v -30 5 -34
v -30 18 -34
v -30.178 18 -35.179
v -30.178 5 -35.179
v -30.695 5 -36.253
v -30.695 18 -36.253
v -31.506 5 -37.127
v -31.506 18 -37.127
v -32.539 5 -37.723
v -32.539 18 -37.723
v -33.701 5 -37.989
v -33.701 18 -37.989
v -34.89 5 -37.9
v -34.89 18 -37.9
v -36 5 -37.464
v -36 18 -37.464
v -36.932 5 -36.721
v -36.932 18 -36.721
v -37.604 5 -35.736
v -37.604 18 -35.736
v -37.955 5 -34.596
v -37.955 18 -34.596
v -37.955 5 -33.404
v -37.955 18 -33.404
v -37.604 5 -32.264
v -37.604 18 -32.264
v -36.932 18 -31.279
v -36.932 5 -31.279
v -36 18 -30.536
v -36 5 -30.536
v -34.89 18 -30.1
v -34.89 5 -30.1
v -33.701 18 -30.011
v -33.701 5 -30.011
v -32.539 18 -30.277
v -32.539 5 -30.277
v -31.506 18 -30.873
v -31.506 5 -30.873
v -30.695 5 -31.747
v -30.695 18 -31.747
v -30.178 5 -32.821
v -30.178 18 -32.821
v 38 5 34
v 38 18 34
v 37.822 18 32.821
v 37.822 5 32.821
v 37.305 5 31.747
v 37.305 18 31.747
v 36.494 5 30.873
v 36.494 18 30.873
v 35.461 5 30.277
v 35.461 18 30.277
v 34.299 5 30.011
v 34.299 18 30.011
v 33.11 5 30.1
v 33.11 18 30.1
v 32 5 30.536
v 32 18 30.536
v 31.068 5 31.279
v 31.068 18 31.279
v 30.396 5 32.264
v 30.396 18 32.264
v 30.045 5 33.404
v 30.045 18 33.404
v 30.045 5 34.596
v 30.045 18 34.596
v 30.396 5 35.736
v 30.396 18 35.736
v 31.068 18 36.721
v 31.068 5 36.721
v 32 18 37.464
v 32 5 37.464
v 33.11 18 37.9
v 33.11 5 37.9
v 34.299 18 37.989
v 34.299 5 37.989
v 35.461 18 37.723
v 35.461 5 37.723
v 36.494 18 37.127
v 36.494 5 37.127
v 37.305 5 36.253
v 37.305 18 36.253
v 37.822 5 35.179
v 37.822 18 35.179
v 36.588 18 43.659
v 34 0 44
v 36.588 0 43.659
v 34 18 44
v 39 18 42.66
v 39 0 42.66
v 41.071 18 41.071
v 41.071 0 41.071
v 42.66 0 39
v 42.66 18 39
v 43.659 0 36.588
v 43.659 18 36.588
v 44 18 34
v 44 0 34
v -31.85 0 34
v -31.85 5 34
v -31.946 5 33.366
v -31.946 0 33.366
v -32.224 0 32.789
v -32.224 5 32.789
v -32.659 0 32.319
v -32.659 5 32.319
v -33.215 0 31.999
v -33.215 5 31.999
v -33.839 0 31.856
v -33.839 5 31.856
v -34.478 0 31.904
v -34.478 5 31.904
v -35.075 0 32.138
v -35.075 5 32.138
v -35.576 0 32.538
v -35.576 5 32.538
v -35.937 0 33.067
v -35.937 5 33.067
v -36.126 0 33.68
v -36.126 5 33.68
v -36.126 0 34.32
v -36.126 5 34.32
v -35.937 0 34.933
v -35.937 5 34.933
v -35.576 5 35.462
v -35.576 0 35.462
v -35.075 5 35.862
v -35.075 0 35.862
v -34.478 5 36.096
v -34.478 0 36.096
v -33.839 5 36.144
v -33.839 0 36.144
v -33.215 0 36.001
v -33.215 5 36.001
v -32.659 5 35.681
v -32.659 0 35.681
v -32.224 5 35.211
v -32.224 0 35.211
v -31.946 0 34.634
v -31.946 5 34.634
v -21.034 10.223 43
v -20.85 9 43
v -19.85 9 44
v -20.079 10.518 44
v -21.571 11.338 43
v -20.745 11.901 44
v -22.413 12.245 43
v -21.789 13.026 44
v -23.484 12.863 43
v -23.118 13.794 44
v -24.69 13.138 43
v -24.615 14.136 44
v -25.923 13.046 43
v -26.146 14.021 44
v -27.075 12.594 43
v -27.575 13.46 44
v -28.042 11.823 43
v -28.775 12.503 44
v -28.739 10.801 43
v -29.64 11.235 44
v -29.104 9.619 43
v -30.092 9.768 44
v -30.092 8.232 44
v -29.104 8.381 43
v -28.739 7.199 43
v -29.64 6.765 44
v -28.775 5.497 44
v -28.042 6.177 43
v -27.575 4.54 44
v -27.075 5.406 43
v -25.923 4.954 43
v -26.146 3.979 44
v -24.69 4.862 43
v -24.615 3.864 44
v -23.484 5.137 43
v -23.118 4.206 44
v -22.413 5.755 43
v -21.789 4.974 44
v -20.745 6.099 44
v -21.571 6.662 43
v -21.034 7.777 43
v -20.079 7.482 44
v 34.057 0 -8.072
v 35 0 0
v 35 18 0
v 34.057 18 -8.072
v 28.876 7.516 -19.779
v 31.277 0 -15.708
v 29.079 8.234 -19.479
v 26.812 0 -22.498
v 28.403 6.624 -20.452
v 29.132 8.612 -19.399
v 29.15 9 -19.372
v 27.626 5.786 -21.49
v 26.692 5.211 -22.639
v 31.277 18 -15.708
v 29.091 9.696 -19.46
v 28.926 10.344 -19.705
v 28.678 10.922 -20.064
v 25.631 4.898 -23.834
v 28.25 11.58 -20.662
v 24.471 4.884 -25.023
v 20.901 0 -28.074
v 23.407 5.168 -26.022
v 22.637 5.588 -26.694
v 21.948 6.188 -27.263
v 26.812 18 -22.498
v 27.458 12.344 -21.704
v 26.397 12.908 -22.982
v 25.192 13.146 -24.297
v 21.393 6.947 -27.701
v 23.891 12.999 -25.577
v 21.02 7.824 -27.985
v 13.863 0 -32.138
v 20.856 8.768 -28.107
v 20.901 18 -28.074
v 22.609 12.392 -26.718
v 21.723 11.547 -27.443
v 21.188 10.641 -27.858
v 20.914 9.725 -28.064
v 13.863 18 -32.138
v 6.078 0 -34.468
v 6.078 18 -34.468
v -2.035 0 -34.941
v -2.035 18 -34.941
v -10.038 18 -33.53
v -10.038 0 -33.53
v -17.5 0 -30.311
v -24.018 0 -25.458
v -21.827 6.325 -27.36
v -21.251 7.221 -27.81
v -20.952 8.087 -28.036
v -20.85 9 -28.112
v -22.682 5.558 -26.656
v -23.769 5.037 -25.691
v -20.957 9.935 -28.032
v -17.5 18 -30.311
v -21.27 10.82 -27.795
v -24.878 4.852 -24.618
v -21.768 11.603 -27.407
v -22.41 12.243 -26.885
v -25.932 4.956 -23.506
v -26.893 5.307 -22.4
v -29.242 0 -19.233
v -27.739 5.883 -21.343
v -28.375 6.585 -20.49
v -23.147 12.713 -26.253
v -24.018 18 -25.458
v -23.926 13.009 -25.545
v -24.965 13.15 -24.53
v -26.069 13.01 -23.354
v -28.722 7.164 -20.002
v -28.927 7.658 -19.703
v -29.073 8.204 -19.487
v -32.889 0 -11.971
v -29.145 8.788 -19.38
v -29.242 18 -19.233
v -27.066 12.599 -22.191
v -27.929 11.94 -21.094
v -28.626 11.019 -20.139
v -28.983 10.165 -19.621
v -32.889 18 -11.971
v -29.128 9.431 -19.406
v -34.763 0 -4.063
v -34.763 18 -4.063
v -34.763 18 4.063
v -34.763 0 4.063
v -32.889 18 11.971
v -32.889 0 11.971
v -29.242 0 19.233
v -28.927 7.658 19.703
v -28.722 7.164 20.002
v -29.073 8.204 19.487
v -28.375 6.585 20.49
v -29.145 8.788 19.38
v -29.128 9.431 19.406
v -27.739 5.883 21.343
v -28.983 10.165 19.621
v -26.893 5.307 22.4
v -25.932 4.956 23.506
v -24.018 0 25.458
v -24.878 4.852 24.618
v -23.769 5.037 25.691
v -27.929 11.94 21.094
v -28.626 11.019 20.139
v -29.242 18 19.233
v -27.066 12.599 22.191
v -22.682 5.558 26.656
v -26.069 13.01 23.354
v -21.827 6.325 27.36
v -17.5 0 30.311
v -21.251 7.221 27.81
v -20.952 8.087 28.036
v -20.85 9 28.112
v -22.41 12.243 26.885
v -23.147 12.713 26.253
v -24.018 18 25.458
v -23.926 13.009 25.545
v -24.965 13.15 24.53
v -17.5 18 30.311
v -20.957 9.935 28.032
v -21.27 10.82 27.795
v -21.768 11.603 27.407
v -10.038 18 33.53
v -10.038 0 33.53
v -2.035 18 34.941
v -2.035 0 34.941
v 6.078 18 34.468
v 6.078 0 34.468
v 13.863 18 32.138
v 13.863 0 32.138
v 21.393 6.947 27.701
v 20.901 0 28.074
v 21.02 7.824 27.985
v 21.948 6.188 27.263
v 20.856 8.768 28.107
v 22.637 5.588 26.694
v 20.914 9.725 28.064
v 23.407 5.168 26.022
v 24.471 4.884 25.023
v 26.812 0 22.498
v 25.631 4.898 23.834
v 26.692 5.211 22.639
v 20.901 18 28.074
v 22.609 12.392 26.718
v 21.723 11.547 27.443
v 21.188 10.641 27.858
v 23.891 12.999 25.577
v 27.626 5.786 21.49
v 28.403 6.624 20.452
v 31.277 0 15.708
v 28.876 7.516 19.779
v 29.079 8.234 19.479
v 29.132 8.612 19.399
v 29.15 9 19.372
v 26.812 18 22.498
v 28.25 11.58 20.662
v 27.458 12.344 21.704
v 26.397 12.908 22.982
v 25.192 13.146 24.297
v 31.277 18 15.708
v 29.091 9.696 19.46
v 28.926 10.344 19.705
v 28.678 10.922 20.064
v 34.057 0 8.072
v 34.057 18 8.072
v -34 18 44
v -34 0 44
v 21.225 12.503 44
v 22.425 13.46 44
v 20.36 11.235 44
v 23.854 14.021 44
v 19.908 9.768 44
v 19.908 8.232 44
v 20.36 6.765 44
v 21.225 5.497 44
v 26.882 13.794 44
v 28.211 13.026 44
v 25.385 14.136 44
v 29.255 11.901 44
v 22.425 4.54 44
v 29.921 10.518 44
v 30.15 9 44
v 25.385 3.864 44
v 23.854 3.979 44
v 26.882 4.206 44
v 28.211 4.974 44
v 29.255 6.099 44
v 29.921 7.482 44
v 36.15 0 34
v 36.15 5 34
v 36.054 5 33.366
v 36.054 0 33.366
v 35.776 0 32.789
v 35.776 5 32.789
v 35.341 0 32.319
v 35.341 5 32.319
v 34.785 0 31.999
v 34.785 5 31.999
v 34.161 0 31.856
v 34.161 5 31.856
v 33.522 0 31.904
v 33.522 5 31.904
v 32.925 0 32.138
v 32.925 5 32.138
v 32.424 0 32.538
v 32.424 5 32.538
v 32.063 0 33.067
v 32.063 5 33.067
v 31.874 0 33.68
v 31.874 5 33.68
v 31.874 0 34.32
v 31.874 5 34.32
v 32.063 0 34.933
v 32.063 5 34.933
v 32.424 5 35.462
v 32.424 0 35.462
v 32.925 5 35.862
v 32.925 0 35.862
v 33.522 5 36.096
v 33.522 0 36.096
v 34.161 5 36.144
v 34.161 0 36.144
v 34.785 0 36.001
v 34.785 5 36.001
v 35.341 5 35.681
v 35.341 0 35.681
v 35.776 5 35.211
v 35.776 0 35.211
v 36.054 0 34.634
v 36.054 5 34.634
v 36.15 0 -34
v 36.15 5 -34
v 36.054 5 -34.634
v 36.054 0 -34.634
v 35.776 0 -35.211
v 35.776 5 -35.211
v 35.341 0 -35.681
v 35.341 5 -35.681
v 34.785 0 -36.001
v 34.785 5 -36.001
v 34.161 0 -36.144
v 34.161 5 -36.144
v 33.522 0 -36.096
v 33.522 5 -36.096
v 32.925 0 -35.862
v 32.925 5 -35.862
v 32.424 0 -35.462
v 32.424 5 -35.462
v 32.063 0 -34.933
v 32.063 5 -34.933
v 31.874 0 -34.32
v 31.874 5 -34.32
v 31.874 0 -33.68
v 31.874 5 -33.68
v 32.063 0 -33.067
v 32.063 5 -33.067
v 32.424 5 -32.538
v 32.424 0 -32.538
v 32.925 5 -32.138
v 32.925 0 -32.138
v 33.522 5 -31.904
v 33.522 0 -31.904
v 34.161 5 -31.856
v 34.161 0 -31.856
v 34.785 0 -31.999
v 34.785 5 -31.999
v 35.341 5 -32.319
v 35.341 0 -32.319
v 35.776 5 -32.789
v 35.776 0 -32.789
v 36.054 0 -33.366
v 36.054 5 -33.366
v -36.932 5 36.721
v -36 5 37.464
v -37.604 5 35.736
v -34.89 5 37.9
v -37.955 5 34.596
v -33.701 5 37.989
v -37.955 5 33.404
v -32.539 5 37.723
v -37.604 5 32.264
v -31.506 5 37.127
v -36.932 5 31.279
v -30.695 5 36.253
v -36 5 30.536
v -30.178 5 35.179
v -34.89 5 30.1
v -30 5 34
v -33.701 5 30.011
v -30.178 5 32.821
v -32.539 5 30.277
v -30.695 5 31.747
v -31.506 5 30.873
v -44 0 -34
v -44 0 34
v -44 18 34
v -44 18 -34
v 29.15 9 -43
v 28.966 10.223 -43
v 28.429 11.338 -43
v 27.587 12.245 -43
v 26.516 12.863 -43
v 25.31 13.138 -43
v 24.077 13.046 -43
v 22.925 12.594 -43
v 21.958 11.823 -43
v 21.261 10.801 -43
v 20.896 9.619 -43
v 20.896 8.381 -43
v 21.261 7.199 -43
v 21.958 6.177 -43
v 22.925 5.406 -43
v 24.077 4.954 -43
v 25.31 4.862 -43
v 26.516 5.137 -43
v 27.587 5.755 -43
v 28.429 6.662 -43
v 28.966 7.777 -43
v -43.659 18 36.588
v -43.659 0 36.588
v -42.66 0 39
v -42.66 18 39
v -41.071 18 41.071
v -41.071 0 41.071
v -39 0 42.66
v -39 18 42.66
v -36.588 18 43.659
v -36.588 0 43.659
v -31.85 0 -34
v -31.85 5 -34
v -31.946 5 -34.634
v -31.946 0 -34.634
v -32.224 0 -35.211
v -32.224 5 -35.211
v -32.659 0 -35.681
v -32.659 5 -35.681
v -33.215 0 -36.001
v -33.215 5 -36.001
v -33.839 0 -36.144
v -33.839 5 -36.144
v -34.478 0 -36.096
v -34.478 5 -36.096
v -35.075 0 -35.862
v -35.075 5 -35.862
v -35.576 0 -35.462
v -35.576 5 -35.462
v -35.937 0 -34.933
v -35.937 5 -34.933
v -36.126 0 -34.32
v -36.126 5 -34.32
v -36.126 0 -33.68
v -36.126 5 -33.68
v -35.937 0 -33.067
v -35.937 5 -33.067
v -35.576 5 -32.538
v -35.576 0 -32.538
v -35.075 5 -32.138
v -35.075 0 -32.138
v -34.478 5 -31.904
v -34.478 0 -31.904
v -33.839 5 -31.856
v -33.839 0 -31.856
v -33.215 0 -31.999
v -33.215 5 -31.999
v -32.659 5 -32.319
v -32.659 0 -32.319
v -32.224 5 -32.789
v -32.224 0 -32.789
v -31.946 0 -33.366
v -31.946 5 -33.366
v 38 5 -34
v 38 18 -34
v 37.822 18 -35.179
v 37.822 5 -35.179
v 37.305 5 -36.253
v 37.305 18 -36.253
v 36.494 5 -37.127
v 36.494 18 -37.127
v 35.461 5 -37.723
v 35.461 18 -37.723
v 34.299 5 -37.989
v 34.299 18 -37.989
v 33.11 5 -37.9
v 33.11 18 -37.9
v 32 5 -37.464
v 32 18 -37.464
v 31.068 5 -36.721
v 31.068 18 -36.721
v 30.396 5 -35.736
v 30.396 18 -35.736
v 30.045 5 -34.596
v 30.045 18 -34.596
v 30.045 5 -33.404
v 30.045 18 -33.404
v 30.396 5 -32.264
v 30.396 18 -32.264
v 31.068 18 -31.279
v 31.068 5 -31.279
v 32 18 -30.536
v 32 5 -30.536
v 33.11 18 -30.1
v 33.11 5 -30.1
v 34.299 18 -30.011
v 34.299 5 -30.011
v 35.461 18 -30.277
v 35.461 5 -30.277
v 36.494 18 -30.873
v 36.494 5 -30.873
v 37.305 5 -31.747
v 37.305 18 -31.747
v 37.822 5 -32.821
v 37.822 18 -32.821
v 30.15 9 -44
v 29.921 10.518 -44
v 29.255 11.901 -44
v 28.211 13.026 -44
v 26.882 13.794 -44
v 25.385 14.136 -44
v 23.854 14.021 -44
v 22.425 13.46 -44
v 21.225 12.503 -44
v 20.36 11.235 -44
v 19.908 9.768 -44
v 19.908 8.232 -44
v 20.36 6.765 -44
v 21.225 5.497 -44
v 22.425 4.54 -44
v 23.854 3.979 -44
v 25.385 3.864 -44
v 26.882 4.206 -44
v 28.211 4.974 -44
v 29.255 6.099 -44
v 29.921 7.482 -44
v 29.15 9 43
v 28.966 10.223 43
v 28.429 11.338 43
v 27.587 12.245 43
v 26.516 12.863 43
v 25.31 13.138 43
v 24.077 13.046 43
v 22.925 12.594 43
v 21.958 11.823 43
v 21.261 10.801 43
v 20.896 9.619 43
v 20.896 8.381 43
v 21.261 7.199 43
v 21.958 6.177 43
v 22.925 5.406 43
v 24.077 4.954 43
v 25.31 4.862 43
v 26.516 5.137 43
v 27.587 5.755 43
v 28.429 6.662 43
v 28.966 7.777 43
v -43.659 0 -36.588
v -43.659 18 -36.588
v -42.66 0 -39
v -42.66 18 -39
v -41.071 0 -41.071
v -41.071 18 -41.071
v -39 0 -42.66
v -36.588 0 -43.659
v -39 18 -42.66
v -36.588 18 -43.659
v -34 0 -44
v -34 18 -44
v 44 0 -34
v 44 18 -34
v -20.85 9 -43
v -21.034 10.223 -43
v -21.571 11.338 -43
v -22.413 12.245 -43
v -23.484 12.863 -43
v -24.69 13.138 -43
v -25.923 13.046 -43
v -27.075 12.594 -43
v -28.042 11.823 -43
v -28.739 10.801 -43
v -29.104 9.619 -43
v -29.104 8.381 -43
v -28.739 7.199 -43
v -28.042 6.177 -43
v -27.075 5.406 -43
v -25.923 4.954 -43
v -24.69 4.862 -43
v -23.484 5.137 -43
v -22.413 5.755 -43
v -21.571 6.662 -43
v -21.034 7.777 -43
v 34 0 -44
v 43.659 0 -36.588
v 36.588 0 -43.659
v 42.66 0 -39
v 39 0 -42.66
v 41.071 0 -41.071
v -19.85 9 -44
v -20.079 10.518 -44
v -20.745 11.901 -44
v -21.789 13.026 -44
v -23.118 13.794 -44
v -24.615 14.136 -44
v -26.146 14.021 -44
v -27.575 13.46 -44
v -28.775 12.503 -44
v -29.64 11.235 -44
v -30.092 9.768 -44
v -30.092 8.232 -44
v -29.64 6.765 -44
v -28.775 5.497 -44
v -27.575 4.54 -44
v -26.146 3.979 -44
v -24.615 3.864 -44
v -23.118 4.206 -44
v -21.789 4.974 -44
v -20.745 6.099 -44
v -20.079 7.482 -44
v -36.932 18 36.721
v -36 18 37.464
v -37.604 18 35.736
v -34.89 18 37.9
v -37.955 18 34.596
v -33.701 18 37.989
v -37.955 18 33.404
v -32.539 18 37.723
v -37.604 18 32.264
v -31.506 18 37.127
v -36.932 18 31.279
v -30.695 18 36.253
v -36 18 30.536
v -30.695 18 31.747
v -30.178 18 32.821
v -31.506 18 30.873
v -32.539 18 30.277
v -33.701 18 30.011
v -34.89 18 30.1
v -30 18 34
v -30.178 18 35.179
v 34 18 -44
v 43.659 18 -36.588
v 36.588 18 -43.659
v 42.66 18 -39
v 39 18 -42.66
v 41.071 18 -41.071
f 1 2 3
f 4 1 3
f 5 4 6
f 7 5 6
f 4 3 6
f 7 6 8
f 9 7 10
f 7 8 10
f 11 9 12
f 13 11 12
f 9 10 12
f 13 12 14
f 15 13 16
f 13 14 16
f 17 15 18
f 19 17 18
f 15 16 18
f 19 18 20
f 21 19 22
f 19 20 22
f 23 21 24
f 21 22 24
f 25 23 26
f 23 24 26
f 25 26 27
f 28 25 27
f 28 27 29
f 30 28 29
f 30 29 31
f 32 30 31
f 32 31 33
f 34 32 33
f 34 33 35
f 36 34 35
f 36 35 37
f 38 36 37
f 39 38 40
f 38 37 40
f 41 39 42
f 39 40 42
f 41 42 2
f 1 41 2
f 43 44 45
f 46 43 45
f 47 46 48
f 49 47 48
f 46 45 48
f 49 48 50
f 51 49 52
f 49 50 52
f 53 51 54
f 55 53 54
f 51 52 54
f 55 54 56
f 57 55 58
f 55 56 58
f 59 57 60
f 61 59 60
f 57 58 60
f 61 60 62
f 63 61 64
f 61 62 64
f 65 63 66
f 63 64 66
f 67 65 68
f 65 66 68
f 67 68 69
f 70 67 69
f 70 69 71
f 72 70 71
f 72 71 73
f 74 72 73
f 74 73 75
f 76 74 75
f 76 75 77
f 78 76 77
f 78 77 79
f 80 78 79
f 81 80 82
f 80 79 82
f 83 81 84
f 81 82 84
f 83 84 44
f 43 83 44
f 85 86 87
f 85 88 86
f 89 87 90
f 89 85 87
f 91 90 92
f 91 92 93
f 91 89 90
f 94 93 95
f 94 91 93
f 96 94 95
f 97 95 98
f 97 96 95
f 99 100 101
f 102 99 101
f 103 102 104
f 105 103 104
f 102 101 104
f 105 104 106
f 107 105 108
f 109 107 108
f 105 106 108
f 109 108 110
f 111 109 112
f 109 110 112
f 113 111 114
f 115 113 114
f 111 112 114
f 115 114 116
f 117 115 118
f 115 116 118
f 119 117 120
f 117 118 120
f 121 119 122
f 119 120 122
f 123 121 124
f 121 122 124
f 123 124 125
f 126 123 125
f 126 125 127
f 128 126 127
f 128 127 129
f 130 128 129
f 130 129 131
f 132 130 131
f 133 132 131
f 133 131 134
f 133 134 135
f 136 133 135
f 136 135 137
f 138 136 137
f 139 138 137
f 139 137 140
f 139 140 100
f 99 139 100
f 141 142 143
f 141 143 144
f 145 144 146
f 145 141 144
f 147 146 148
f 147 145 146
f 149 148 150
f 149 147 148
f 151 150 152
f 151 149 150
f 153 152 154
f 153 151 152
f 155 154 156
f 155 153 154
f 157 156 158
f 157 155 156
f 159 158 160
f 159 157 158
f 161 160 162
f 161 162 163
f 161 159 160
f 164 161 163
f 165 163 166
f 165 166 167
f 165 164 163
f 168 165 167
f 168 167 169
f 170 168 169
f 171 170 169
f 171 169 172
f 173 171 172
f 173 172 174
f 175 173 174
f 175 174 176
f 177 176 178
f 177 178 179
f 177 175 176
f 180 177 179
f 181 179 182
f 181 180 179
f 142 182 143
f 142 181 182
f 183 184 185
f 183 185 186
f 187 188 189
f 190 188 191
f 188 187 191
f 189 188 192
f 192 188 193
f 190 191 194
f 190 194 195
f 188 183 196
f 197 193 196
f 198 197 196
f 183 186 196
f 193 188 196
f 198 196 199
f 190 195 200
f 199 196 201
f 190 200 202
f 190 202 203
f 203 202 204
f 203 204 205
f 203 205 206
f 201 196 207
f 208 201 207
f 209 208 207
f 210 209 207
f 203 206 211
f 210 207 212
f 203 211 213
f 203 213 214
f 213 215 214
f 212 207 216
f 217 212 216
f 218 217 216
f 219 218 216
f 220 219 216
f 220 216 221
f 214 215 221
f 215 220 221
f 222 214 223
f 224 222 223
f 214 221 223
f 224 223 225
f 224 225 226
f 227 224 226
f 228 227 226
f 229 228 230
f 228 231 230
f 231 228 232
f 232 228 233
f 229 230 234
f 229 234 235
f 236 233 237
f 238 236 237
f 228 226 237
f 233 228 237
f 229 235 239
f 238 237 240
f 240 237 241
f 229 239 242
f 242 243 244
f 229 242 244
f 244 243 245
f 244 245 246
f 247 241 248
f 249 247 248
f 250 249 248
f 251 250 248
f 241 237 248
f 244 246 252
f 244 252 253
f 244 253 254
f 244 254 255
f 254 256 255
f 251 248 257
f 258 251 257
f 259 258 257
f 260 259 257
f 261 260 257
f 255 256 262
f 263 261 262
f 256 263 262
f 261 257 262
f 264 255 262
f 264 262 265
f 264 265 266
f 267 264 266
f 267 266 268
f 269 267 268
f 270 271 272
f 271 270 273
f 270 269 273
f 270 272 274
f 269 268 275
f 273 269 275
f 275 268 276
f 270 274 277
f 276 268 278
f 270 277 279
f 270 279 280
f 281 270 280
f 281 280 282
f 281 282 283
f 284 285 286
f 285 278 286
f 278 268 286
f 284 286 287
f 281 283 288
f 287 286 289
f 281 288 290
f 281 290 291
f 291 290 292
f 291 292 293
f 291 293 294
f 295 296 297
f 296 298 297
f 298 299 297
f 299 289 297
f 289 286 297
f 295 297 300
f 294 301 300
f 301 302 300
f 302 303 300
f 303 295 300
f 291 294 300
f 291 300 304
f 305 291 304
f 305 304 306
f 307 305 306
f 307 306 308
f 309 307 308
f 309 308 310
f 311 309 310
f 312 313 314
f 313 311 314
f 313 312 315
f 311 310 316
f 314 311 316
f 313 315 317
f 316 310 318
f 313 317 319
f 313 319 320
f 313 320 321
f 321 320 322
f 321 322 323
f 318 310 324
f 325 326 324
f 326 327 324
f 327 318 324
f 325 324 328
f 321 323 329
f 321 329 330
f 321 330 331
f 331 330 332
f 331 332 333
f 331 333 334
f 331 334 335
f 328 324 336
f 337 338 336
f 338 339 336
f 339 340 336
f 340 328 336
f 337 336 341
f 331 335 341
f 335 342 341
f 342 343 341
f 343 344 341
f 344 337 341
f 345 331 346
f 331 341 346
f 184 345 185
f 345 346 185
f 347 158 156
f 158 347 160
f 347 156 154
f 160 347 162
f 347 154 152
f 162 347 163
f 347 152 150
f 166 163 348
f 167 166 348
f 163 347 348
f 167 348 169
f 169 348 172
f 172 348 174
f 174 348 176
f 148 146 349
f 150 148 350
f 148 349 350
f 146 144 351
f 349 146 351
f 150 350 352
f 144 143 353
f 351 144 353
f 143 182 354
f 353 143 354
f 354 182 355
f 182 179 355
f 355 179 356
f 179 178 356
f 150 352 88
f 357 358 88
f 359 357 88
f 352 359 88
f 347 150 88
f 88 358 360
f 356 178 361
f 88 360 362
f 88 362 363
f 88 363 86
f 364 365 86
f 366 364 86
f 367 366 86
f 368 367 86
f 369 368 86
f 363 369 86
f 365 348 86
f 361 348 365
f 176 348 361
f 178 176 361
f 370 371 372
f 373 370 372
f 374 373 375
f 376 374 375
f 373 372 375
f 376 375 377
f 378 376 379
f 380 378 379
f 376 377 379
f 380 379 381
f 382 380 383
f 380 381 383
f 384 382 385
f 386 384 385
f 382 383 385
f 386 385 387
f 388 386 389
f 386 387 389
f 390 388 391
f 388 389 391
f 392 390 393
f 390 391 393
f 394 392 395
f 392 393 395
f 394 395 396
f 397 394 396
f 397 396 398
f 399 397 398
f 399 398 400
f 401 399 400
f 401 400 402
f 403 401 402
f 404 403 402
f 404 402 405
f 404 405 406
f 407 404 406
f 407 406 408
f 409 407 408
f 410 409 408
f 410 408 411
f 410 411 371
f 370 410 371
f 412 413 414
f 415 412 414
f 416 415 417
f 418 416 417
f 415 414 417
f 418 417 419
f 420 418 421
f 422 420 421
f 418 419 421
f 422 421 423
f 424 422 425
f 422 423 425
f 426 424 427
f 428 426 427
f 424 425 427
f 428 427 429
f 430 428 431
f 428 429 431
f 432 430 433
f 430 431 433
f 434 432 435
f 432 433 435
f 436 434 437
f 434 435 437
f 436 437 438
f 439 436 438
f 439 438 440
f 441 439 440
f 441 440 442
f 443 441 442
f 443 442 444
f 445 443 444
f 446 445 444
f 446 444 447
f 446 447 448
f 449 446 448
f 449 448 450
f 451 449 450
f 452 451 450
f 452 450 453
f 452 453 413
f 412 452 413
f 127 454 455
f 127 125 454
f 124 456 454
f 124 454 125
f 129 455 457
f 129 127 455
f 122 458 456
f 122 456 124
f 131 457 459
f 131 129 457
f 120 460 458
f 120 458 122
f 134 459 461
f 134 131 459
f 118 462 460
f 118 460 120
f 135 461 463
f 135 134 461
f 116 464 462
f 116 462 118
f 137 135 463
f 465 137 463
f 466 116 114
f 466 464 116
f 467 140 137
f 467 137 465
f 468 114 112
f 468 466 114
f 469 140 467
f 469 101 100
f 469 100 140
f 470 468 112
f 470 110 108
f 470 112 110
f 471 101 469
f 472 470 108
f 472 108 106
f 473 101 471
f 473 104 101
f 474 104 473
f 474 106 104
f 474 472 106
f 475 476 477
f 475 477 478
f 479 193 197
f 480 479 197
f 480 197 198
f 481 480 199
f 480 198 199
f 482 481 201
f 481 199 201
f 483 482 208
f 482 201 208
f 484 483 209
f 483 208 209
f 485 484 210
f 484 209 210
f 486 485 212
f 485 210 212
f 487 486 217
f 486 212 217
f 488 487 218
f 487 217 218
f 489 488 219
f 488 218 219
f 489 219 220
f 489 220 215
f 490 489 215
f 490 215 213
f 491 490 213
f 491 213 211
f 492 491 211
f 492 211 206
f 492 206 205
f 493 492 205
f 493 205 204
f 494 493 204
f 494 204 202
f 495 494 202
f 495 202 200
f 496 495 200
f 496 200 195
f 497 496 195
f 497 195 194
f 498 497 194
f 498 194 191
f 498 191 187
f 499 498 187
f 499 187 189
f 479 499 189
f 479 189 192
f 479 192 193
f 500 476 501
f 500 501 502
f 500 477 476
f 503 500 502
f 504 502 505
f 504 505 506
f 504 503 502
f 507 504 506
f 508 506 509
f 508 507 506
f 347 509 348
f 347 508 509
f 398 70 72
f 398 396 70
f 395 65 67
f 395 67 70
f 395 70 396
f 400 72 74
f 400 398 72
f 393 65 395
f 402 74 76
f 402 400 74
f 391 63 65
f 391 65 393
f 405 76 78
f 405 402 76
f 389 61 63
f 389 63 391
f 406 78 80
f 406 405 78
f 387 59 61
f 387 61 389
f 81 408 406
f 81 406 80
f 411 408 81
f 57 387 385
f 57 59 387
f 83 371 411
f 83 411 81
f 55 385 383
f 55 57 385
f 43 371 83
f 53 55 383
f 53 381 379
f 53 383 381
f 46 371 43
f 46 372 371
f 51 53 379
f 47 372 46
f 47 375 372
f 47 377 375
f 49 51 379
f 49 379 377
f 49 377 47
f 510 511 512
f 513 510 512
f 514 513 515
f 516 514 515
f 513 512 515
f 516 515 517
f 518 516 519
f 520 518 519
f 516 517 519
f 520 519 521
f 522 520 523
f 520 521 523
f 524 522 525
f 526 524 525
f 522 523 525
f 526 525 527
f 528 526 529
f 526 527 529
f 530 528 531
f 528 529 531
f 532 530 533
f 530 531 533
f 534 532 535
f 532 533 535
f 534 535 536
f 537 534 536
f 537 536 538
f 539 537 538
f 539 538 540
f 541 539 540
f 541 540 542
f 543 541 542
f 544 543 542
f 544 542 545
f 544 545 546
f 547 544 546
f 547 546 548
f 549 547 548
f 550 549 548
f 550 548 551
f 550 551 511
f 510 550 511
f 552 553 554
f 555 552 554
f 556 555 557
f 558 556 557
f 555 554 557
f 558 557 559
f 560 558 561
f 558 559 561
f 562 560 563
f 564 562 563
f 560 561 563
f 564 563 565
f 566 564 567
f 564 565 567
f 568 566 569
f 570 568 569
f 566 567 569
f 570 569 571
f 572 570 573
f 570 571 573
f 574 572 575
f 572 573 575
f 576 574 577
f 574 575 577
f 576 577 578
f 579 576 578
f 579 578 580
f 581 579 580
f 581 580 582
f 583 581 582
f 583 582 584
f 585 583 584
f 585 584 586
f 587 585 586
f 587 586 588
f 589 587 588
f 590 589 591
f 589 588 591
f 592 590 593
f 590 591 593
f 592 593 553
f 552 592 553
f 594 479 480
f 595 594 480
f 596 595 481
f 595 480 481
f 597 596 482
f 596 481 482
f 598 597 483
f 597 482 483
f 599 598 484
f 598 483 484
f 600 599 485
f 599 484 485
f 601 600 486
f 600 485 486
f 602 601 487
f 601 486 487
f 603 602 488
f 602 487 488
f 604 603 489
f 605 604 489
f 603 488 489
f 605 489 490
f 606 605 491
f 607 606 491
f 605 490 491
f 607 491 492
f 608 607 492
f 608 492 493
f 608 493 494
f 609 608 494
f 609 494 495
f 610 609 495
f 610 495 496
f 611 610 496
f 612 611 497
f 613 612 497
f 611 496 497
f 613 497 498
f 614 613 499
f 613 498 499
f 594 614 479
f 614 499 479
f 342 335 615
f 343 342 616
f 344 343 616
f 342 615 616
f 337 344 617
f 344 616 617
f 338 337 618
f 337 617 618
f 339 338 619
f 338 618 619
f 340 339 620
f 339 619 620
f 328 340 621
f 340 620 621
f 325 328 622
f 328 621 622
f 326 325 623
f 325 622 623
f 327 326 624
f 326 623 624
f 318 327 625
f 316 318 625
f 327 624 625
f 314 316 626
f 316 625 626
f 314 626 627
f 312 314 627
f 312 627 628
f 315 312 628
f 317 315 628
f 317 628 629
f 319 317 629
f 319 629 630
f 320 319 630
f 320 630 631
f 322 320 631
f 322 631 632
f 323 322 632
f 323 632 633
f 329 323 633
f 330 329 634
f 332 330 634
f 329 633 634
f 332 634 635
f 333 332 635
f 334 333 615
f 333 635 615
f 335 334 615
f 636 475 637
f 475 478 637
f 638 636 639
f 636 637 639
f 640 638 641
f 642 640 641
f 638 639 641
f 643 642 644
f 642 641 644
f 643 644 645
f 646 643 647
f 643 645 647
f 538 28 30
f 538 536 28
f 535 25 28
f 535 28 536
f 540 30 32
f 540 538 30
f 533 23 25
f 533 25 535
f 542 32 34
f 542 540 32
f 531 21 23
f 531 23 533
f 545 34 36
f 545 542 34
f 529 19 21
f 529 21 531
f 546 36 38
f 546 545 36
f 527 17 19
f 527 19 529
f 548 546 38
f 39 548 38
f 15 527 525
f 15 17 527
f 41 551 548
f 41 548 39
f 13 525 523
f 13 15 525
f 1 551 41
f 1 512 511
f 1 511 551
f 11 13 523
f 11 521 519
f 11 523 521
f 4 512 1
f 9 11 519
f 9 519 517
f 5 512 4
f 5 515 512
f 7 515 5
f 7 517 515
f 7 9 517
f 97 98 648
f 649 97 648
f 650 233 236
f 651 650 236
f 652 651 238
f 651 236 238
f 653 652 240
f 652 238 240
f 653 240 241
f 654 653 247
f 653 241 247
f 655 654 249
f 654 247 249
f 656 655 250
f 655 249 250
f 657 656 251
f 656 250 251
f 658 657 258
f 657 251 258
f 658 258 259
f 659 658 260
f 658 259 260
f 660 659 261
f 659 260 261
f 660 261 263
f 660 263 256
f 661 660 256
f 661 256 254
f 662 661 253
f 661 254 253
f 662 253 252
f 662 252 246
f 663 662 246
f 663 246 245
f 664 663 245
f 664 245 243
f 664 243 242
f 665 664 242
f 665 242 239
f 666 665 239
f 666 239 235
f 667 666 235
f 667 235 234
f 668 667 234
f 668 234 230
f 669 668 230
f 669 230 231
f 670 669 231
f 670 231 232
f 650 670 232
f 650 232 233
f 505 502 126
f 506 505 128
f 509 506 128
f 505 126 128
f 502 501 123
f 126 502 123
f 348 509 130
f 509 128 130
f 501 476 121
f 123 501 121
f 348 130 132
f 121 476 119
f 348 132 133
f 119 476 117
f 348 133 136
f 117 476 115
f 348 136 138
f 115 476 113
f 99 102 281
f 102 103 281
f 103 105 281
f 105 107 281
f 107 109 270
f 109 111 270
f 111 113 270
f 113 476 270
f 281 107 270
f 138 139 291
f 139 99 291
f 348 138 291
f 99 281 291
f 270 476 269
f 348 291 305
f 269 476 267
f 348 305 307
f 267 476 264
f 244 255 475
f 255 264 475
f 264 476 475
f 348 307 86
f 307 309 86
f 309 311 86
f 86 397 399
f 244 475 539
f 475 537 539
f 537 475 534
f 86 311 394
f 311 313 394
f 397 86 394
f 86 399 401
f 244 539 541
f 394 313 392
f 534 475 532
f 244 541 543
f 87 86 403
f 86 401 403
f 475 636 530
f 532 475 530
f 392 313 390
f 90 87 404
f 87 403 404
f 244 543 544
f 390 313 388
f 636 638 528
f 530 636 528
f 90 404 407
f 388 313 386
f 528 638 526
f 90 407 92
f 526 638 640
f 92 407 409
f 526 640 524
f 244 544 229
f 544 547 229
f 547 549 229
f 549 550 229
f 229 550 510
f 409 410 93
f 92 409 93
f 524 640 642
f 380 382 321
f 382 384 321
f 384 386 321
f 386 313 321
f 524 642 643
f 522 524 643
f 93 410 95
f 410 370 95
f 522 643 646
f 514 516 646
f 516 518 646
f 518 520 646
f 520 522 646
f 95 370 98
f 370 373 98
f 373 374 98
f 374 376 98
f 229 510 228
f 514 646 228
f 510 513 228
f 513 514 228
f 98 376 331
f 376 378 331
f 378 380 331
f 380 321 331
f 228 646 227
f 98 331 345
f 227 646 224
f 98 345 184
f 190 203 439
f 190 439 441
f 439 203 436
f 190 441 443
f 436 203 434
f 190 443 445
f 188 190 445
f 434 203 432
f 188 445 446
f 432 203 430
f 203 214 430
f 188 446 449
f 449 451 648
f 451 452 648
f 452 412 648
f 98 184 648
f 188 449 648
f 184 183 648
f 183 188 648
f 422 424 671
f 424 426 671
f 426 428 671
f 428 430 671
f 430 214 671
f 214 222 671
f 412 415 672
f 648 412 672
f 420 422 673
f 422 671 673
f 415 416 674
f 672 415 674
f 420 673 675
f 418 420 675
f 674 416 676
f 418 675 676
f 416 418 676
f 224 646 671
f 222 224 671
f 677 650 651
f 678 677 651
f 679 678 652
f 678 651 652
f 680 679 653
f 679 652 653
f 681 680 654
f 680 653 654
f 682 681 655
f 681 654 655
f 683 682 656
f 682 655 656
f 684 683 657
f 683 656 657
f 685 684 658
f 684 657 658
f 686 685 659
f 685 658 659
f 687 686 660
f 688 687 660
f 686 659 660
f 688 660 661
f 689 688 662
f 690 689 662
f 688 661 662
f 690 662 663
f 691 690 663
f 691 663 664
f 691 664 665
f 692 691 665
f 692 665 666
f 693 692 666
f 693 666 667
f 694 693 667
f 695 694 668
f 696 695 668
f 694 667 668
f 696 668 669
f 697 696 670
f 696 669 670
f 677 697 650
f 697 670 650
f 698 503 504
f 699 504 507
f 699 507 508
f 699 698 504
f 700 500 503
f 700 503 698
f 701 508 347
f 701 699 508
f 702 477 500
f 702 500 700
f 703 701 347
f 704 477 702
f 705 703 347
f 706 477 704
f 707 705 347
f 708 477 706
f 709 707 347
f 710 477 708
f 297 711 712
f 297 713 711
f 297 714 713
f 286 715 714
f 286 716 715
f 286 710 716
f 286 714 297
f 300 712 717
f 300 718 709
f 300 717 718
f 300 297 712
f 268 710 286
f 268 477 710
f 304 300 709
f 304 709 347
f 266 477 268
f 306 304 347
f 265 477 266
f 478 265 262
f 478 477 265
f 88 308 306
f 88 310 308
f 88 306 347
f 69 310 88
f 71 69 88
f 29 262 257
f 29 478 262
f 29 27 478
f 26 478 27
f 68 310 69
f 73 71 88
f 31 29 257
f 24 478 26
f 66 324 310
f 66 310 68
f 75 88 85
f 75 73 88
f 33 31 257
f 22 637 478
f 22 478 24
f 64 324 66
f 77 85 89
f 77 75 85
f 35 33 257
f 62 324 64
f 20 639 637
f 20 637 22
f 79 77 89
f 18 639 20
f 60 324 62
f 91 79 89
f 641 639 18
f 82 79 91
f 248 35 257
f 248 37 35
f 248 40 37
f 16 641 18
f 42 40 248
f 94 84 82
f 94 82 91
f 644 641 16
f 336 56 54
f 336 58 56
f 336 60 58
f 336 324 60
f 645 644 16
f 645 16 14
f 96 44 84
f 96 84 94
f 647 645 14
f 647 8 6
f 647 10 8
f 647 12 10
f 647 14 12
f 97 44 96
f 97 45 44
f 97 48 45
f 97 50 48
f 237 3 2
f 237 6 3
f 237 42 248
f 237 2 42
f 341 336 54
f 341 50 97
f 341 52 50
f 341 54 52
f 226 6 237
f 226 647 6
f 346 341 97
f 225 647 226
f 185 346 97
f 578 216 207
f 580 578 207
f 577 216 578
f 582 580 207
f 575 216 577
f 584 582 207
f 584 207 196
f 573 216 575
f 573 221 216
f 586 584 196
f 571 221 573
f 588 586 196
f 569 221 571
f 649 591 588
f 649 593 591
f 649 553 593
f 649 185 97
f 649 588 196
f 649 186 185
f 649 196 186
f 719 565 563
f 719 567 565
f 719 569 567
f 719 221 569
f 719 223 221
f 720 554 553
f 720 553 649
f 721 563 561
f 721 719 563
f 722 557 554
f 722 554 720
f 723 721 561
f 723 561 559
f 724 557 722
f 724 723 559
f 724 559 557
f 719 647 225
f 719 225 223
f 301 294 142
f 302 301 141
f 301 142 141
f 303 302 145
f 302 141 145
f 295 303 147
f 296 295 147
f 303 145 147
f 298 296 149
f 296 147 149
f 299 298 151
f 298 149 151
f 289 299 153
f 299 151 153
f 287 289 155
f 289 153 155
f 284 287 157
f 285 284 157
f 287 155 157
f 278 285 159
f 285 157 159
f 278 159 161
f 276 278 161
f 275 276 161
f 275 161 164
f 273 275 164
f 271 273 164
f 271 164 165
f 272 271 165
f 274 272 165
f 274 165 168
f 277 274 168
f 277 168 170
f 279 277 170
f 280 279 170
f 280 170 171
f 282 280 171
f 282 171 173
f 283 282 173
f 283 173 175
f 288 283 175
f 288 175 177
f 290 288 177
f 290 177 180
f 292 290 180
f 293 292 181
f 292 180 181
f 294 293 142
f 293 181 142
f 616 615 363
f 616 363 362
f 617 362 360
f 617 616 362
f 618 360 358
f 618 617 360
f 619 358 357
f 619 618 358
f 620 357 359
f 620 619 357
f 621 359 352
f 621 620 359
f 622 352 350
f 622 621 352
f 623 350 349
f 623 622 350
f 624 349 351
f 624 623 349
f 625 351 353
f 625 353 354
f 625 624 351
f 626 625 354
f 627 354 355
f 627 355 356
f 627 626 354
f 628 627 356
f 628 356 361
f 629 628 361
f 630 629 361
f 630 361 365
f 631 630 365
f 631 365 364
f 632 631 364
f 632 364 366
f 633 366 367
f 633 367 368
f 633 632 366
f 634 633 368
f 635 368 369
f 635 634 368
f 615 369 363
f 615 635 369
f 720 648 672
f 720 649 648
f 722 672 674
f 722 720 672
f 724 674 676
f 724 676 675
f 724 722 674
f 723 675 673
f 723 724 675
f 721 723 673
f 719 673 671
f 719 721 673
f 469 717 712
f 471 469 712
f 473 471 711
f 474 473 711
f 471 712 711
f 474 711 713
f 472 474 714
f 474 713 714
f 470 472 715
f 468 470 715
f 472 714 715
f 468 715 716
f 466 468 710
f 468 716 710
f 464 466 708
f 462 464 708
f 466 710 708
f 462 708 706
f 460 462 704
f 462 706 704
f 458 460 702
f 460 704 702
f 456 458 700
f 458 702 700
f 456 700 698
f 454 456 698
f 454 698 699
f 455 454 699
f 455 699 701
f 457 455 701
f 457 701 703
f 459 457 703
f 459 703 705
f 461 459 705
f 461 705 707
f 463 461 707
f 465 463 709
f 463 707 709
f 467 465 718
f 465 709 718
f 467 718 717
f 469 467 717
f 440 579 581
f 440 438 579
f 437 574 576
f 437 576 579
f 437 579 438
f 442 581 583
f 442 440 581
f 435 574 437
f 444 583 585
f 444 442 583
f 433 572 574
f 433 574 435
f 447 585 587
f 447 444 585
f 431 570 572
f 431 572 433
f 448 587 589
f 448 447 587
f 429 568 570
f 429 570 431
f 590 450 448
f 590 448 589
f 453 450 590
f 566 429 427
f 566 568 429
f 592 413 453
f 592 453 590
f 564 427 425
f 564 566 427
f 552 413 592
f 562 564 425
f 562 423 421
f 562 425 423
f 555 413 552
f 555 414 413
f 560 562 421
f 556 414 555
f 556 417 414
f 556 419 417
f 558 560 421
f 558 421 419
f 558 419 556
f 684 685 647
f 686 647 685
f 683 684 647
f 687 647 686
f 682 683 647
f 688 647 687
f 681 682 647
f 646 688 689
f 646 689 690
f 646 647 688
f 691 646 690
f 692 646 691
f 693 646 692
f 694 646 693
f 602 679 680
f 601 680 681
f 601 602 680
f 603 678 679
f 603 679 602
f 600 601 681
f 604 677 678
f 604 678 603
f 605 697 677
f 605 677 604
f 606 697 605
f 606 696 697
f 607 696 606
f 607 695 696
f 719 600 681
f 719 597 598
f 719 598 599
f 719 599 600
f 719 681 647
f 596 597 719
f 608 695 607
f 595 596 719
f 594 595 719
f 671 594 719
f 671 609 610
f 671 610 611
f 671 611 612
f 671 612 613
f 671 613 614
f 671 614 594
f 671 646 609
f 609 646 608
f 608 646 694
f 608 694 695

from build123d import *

# Parameters (mm, degrees)
SKETCH1_W           = 88
SKETCH1_H           = 88
BOSS_EXTRUDE1_DEPTH = 18
FILLET1_R           = 10
SKETCH2_R           = 2.15
CUT_EXTRUDE1_DEPTH  = 19
SKETCH3_R           = 4.15
CUT_EXTRUDE2_DEPTH  = 89
SKETCH4_R           = 35
CUT_EXTRUDE3_DEPTH  = 19
CHAMFER1_SIZE       = 1
SKETCH5_R           = 4
CUT_EXTRUDE4_DEPTH  = 13


with BuildPart() as part:
    # Sketch1 → Boss-Extrude1 (new body)
    with BuildSketch(Plane(origin=(0, 0, 0), x_dir=(1, 0, 0), z_dir=(0, 1, 0))):
        Rectangle(SKETCH1_W, SKETCH1_H)
    extrude(amount=BOSS_EXTRUDE1_DEPTH)

    # Fillet1
    fillet1_edges = [part.edges().sort_by_distance(p)[0] for p in [
        (-44, 9, -44),
        (-44, 9, 44),
        (44, 9, 44),
        (44, 9, -44),
    ]]
    fillet(fillet1_edges, radius=FILLET1_R)

    # Sketch2 → Cut-Extrude1 (cut, through all)
    with BuildSketch(Plane(origin=(0, 18, 0), x_dir=(1, 0, 0), z_dir=(0, 1, 0))):
        with Locations((-34, 34)):
            Circle(SKETCH2_R)
        with Locations((34, 34)):
            Circle(SKETCH2_R)
        with Locations((34, -34)):
            Circle(SKETCH2_R)
        with Locations((-34, -34)):
            Circle(SKETCH2_R)
    extrude(amount=-CUT_EXTRUDE1_DEPTH, mode=Mode.SUBTRACT)

    # Sketch3 → Cut-Extrude2 (cut, through all)
    with BuildSketch(Plane.XY.offset(44)):
        with Locations((-25, 9)):
            Circle(SKETCH3_R)
        with Locations((25, 9)):
            Circle(SKETCH3_R)
    extrude(amount=-CUT_EXTRUDE2_DEPTH, mode=Mode.SUBTRACT)

    # Sketch4 → Cut-Extrude3 (cut, through all)
    with BuildSketch(Plane(origin=(0, 18, 0), x_dir=(1, 0, 0), z_dir=(0, 1, 0))):
        Circle(SKETCH4_R)
    extrude(amount=-CUT_EXTRUDE3_DEPTH, mode=Mode.SUBTRACT)

    # Chamfer1
    chamfer1_edges = [part.edges().sort_by_distance(p)[0] for p in [
        (-29.15, 9, -44),
        (-29.15, 9, 44),
        (20.85, 9, -44),
        (20.85, 9, 44),
    ]]
    chamfer(chamfer1_edges, length=CHAMFER1_SIZE)

    # Sketch5 → Cut-Extrude4 (cut)
    with BuildSketch(Plane(origin=(0, 18, 0), x_dir=(1, 0, 0), z_dir=(0, 1, 0))):
        with Locations((-34, 34)):
            Circle(SKETCH5_R)
        with Locations((34, 34)):
            Circle(SKETCH5_R)
        with Locations((34, -34)):
            Circle(SKETCH5_R)
        with Locations((-34, -34)):
            Circle(SKETCH5_R)
    extrude(amount=-CUT_EXTRUDE4_DEPTH, mode=Mode.SUBTRACT)


solid = part.part
